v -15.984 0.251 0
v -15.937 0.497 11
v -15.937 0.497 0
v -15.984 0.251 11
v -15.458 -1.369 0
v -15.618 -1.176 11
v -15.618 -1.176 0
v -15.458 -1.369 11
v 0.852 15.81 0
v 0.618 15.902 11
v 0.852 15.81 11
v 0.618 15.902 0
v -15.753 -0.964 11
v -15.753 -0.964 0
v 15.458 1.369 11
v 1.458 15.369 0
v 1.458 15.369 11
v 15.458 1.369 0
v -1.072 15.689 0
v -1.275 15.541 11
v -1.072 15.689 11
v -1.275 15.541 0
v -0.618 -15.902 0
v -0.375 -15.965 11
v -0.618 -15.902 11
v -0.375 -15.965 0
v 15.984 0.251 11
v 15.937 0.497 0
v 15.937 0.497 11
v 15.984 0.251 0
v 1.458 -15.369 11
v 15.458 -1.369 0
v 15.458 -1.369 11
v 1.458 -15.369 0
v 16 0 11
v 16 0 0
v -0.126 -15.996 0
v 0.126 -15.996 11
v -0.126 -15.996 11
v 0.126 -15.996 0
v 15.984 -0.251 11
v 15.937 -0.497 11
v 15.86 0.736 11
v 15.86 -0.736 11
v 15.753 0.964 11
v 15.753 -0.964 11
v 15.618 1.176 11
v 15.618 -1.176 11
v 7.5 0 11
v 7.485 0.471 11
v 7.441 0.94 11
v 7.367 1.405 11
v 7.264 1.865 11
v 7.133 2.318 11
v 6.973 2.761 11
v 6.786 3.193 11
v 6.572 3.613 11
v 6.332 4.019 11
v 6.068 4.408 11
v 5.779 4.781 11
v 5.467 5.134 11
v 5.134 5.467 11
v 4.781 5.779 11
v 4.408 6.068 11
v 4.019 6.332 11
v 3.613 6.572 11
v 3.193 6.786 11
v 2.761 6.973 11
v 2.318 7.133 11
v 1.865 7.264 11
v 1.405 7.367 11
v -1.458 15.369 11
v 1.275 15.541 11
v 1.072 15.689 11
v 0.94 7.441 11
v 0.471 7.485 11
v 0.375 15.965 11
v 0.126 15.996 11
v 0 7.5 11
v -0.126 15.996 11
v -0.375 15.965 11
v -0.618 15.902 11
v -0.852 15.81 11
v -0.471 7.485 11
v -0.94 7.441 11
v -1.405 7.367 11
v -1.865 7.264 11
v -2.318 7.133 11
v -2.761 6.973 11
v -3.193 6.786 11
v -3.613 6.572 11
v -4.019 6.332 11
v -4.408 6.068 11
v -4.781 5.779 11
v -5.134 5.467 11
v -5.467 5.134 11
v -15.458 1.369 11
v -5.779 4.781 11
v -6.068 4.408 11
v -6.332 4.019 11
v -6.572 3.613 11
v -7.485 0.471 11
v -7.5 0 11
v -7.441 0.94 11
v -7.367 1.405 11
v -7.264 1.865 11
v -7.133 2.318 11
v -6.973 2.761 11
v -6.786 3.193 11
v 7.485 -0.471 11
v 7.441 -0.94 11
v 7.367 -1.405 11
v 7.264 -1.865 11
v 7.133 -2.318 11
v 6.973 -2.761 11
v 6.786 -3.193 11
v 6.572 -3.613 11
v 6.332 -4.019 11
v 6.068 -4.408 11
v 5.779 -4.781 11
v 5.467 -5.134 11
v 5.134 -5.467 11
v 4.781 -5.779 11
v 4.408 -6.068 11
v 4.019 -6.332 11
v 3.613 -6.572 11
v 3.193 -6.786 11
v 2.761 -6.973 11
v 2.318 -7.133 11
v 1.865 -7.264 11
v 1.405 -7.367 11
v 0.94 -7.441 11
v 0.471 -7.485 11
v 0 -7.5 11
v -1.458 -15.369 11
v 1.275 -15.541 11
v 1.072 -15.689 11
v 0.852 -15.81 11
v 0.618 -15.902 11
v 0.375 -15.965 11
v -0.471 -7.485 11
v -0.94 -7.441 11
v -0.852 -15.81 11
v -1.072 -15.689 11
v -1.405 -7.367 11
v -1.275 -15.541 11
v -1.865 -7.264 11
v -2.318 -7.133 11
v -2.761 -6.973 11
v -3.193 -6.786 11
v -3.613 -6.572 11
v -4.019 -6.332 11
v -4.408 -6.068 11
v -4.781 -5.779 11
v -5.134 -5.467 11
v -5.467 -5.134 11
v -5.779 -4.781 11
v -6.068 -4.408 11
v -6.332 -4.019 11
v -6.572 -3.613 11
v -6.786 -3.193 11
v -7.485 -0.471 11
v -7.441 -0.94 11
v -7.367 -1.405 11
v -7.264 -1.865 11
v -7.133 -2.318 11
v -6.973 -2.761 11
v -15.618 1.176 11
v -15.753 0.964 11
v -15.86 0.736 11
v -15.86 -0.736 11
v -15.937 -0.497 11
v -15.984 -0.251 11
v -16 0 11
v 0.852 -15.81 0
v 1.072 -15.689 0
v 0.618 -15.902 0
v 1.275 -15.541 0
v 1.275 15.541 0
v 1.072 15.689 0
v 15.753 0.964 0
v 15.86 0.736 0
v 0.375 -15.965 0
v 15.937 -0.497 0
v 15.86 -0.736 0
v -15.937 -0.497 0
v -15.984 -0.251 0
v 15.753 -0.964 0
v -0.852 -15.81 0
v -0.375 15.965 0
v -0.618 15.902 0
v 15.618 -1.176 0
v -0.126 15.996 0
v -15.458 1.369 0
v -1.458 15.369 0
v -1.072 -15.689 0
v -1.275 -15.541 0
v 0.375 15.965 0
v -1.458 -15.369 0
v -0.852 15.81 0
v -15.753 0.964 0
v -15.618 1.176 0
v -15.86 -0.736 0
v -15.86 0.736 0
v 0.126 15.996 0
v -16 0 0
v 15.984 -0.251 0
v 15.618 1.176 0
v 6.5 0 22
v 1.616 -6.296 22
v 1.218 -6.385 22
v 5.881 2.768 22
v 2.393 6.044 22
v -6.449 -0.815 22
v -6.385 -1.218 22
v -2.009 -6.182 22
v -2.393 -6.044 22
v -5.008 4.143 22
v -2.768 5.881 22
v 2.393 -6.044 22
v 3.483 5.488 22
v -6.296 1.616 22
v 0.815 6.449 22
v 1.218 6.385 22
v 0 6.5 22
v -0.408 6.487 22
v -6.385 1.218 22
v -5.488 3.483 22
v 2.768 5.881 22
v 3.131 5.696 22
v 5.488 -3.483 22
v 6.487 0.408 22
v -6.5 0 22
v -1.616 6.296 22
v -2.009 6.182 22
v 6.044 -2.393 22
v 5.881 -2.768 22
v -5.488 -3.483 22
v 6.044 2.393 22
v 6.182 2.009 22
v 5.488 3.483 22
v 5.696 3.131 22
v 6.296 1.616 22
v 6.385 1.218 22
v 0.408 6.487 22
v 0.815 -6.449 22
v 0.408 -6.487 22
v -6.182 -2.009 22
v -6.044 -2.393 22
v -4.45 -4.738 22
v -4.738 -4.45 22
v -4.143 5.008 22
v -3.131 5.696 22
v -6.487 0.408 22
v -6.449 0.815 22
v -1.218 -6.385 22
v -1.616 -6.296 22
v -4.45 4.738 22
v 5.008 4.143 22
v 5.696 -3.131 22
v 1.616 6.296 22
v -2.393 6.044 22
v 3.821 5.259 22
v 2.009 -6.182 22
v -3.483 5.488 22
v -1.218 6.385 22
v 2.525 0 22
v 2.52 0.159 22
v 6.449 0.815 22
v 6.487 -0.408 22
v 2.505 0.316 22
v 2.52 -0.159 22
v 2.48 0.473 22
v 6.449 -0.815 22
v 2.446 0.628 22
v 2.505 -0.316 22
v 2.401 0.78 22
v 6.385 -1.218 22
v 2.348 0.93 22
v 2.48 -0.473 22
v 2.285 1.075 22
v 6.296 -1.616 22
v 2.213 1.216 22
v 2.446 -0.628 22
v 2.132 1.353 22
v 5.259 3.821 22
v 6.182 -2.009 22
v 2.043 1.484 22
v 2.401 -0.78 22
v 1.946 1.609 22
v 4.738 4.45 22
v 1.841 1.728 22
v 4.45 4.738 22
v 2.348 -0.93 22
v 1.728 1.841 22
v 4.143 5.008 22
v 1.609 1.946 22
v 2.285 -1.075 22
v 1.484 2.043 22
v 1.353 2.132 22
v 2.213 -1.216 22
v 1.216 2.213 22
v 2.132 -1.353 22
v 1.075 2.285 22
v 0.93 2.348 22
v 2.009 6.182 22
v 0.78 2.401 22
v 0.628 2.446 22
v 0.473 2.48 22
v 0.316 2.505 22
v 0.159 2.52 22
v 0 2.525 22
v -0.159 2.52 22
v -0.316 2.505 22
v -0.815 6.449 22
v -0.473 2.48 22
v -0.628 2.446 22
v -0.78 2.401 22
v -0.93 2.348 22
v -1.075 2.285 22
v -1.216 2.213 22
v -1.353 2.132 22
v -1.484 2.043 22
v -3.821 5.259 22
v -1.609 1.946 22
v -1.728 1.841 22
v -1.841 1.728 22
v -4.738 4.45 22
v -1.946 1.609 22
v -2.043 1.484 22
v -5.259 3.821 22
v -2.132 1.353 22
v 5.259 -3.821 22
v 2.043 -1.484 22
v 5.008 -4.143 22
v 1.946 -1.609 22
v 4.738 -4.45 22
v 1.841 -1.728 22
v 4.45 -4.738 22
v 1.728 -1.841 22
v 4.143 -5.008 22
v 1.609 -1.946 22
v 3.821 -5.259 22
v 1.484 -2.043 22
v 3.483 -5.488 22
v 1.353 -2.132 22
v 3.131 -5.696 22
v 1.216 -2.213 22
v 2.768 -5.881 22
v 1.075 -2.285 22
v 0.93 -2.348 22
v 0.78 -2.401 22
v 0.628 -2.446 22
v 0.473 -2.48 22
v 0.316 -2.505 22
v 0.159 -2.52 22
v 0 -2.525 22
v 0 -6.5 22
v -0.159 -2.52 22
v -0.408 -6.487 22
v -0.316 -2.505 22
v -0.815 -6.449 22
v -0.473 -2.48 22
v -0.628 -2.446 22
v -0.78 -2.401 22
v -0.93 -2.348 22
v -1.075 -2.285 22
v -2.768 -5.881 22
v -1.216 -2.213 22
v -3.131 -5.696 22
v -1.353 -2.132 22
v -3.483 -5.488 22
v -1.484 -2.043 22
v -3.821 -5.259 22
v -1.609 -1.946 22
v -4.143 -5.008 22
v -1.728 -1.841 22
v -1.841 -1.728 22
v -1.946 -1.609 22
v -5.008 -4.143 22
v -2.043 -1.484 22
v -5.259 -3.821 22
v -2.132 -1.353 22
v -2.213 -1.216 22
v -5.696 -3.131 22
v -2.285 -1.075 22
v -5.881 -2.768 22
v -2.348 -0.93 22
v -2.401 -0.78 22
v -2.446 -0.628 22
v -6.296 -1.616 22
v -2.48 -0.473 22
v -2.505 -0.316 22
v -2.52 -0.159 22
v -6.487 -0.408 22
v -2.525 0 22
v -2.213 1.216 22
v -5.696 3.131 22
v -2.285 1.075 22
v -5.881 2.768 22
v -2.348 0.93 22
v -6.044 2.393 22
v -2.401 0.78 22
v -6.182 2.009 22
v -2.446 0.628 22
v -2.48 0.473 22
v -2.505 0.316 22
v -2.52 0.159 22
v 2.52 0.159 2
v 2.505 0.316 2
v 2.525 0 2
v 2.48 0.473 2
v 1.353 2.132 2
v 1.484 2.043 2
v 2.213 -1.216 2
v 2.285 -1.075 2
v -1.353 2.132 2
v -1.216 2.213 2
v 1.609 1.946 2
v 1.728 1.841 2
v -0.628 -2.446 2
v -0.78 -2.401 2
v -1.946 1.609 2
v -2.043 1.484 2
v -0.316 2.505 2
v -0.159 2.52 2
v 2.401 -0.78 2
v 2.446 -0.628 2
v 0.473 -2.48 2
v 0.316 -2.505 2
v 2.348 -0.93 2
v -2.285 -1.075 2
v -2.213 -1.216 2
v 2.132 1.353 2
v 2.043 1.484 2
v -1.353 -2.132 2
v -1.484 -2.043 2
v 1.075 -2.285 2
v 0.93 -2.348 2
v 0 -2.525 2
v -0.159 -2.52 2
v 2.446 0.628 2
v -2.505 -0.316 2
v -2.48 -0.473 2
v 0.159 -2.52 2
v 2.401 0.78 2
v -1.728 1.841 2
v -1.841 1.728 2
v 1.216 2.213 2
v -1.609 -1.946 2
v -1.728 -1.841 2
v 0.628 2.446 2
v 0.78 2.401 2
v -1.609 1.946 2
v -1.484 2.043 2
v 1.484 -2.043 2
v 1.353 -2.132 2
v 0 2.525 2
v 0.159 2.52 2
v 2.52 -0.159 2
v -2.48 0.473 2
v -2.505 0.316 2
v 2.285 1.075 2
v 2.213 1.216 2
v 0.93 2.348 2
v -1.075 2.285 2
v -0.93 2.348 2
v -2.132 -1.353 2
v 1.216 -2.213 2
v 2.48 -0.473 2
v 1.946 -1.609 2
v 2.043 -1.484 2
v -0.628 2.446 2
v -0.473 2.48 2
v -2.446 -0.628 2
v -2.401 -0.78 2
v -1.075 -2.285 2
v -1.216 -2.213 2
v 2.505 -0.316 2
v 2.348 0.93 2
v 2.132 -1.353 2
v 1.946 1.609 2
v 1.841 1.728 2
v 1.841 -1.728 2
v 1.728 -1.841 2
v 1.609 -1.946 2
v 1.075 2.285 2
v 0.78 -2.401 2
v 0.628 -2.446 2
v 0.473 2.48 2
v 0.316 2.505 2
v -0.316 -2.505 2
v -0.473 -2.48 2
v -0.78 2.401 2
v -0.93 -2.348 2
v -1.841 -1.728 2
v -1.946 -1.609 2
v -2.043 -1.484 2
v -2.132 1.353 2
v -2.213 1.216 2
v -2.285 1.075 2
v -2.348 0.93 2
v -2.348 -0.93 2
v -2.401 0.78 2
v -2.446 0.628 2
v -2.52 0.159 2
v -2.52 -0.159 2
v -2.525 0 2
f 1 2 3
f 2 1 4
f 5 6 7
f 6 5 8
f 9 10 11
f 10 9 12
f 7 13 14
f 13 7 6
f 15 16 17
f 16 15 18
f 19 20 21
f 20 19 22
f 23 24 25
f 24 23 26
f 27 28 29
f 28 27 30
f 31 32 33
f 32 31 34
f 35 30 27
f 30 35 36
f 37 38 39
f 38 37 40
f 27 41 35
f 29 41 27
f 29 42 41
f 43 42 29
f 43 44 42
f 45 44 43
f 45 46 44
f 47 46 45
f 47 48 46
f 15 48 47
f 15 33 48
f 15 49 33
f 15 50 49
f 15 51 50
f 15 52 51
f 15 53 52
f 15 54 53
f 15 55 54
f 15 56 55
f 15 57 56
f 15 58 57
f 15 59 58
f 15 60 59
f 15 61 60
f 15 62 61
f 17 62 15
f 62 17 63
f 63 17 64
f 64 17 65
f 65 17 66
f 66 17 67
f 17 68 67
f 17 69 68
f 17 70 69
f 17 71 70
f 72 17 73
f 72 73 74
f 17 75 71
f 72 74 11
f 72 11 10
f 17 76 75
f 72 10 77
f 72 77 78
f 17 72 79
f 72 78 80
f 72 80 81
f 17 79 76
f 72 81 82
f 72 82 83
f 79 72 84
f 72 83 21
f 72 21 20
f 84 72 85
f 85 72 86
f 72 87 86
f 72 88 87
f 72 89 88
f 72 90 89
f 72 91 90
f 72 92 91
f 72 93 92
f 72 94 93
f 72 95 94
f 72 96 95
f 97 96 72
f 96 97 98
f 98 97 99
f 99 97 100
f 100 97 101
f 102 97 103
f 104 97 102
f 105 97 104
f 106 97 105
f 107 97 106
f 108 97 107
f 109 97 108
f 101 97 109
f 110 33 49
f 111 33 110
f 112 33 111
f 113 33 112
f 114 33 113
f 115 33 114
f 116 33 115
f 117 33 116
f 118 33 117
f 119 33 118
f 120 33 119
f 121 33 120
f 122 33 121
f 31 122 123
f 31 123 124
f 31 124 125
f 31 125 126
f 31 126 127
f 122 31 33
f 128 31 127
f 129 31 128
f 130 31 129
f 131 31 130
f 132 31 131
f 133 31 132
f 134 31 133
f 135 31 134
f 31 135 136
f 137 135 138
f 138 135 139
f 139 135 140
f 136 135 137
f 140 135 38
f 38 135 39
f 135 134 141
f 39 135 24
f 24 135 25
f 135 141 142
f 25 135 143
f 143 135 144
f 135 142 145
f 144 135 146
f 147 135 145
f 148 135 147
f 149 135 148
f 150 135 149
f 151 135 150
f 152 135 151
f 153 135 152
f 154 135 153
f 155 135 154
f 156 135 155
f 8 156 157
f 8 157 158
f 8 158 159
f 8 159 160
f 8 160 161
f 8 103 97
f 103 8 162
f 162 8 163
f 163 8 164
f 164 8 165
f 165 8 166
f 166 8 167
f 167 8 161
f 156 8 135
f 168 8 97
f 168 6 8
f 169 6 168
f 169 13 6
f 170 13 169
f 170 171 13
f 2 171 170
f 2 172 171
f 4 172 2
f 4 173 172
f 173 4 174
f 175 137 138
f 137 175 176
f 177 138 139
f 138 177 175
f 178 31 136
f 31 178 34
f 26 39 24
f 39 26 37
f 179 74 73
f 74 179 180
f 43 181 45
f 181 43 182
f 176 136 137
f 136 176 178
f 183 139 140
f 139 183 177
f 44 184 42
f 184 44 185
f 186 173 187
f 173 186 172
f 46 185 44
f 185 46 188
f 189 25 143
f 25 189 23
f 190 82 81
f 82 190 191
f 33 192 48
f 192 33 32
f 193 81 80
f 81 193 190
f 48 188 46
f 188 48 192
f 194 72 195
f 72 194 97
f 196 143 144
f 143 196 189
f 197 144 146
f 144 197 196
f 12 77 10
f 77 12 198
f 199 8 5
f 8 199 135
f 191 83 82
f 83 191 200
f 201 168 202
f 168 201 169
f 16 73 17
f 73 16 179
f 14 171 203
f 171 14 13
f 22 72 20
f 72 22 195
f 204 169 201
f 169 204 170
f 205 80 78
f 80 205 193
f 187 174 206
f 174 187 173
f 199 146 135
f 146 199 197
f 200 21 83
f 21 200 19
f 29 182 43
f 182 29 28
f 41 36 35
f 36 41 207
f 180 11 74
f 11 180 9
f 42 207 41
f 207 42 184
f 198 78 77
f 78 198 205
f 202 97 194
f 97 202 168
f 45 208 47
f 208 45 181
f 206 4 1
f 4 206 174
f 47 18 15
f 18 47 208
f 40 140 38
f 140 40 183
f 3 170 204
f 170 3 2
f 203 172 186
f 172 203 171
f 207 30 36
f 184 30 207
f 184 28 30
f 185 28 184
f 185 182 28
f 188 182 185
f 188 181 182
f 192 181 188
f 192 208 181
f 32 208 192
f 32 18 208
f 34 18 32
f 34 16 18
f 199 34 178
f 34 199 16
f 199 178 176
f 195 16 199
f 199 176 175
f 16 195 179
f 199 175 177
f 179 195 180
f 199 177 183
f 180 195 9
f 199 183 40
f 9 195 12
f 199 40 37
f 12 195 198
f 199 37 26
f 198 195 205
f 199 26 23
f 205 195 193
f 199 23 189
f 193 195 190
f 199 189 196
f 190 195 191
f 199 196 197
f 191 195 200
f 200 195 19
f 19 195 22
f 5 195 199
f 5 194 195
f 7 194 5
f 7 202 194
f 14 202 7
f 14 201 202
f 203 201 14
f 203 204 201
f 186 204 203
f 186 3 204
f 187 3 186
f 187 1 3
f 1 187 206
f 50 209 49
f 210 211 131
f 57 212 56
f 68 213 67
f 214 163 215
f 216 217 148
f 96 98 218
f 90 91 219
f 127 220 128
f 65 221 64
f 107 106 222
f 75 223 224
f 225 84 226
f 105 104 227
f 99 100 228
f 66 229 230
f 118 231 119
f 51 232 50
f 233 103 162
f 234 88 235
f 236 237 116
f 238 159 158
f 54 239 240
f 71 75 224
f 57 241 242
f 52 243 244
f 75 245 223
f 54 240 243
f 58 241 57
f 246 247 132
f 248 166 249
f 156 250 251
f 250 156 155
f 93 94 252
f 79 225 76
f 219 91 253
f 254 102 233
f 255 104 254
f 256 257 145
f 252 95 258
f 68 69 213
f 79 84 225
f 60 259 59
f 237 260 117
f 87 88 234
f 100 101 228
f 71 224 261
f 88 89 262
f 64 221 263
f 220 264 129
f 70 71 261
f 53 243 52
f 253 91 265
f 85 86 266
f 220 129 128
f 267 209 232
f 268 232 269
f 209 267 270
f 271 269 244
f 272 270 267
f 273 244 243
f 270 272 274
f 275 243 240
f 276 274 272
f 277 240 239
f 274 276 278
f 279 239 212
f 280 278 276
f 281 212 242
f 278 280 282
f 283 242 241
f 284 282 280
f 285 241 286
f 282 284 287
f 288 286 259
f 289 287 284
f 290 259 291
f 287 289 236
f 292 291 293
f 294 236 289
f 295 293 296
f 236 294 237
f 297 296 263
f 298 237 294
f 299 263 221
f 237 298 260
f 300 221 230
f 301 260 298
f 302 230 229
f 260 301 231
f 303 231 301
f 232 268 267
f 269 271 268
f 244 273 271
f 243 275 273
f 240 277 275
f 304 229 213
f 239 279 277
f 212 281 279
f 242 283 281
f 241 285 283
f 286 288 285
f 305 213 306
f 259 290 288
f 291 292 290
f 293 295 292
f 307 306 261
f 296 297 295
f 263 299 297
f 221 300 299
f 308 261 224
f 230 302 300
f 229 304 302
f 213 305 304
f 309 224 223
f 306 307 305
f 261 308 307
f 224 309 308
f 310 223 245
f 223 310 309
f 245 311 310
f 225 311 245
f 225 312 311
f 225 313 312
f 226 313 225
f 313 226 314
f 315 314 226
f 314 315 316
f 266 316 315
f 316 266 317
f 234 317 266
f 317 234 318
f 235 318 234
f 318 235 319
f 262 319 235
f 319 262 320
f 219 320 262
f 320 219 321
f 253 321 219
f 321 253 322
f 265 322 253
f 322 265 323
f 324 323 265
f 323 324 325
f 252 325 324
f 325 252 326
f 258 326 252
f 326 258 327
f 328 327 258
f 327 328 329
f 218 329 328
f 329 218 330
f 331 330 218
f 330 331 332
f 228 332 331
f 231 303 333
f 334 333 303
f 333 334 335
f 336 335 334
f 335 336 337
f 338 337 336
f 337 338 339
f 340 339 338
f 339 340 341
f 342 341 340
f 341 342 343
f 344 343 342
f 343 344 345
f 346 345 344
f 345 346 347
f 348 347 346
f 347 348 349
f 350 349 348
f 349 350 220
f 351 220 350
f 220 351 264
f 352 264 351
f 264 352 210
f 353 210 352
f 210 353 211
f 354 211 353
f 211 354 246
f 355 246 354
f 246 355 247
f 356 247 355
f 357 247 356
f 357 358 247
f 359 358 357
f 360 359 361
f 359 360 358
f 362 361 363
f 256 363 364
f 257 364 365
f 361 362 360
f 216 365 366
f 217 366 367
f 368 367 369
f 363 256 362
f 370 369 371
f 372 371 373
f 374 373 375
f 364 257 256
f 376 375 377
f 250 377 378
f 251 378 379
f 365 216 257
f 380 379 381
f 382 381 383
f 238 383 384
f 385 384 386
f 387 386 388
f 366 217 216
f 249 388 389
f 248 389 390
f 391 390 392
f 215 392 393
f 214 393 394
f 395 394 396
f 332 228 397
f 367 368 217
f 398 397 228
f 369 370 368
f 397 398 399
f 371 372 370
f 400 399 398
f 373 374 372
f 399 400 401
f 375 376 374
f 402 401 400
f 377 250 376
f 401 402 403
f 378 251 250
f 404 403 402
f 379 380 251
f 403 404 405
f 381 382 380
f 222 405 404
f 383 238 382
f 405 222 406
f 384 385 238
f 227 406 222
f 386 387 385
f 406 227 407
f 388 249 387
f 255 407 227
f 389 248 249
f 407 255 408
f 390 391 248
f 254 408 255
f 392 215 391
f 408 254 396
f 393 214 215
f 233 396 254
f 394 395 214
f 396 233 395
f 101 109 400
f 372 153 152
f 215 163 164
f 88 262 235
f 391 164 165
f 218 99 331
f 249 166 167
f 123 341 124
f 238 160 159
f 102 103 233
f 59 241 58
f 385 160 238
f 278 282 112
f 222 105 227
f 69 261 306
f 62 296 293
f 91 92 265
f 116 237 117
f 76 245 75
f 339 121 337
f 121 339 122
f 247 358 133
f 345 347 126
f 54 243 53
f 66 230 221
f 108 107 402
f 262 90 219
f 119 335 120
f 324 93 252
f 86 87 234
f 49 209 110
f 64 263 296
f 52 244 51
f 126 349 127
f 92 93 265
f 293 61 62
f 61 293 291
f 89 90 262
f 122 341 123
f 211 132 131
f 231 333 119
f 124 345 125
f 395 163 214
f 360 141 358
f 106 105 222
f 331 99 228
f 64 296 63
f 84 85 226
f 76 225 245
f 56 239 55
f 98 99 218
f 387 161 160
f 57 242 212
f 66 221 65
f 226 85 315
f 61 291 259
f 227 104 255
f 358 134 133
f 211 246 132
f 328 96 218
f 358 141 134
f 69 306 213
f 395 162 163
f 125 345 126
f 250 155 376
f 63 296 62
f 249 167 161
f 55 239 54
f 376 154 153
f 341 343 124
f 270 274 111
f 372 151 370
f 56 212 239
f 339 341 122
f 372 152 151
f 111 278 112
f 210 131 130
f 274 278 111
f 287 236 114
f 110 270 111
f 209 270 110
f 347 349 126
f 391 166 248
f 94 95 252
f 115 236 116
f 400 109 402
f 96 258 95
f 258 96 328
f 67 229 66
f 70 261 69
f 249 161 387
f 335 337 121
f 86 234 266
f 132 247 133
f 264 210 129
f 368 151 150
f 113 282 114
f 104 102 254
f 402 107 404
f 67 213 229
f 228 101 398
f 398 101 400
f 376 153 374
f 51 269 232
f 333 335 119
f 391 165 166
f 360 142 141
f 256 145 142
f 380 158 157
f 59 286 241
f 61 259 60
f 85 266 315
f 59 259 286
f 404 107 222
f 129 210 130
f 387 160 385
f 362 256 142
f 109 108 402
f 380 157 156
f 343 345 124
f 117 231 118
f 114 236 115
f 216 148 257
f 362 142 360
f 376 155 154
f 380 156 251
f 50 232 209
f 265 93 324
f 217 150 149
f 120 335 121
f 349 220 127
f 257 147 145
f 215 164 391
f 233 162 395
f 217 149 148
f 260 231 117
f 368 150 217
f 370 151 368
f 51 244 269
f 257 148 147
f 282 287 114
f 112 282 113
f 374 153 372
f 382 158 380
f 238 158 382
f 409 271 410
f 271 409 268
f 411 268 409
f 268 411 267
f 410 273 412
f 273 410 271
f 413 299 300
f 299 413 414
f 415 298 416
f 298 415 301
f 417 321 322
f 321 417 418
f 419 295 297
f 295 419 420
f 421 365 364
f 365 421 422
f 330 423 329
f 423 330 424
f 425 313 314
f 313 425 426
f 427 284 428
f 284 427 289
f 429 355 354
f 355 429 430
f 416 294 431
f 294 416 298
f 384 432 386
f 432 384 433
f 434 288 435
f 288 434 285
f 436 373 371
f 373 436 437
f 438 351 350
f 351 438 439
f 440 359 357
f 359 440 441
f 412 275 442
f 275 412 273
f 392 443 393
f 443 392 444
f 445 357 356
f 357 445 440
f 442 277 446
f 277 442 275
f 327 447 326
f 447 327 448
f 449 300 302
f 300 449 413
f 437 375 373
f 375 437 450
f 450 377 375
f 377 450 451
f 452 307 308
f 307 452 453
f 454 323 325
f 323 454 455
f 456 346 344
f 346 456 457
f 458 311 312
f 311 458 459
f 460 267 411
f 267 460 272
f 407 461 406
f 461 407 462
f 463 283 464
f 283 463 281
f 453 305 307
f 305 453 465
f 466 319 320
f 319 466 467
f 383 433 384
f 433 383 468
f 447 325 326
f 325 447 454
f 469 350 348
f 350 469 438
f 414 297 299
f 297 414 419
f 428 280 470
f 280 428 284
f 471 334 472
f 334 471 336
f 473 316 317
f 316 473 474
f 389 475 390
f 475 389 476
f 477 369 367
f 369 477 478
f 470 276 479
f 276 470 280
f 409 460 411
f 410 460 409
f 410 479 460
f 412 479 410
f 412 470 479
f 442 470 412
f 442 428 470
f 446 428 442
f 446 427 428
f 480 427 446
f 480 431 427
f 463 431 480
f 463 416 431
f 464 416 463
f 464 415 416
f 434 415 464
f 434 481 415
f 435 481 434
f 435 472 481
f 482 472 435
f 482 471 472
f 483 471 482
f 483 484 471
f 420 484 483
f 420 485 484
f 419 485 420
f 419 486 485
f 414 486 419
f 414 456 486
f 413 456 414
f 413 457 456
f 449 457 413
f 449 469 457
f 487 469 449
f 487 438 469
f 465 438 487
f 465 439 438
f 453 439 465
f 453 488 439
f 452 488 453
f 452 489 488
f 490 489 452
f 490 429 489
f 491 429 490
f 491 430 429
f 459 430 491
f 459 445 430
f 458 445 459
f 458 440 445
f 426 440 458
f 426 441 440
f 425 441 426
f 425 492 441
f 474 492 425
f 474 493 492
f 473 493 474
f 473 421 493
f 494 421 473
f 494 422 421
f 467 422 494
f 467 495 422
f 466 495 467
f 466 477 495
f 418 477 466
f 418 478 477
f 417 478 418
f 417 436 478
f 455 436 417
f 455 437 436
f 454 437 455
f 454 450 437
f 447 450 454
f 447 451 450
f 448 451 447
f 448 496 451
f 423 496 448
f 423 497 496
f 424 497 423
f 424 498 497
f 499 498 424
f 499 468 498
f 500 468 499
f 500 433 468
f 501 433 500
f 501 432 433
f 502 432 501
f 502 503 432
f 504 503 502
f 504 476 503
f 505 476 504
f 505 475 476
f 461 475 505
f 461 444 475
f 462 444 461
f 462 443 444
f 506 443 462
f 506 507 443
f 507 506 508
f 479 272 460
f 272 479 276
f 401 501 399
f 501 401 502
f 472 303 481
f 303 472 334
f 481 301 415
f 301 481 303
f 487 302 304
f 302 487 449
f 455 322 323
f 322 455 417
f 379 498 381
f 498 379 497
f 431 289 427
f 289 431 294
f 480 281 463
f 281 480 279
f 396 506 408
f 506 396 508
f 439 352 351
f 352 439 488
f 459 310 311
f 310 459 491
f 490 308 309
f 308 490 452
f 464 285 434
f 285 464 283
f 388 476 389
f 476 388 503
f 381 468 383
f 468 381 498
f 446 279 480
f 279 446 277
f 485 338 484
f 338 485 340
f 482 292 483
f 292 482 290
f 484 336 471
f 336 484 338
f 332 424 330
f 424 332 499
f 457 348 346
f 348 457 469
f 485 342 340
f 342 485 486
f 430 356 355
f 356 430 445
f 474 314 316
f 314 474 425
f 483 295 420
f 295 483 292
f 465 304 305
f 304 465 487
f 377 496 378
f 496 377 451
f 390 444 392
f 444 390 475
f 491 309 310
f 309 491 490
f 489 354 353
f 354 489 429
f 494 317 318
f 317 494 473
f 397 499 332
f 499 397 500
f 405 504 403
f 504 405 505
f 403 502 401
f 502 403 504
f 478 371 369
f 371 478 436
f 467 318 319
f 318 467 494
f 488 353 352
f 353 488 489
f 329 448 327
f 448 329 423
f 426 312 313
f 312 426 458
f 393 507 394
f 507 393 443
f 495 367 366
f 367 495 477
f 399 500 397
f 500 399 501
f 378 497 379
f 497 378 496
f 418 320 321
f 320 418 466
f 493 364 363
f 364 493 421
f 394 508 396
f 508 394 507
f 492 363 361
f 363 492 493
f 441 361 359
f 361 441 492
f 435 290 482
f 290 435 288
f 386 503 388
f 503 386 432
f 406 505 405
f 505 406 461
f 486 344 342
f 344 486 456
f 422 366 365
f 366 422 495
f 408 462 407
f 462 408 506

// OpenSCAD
hc=11;
$fn=100;
cylh=11;
holediam=5.05;

module base(){
    i=14;
    $fn=50;
    
    rc=2;
    hull(){
        translate([i,0,0])
        cylinder(h=hc,r=rc);
        translate([0,i,0])
        cylinder(h=hc,r=rc);
        translate([-i,0,0])
        cylinder(h=hc,r=rc);
        translate([0,-i,0])
        cylinder(h=hc,r=rc);
    
}}

module cylup(){
    diam=22;
translate([0,0,hc]) cylinder(d1=15,d2=13,h=cylh);
}

module hole1(){
    cylinder(d=holediam, h=hc+cylh);
}

difference(){
    union(){
        base();
        cylup();
    }
    translate([0,0,2]) hole1();
}
